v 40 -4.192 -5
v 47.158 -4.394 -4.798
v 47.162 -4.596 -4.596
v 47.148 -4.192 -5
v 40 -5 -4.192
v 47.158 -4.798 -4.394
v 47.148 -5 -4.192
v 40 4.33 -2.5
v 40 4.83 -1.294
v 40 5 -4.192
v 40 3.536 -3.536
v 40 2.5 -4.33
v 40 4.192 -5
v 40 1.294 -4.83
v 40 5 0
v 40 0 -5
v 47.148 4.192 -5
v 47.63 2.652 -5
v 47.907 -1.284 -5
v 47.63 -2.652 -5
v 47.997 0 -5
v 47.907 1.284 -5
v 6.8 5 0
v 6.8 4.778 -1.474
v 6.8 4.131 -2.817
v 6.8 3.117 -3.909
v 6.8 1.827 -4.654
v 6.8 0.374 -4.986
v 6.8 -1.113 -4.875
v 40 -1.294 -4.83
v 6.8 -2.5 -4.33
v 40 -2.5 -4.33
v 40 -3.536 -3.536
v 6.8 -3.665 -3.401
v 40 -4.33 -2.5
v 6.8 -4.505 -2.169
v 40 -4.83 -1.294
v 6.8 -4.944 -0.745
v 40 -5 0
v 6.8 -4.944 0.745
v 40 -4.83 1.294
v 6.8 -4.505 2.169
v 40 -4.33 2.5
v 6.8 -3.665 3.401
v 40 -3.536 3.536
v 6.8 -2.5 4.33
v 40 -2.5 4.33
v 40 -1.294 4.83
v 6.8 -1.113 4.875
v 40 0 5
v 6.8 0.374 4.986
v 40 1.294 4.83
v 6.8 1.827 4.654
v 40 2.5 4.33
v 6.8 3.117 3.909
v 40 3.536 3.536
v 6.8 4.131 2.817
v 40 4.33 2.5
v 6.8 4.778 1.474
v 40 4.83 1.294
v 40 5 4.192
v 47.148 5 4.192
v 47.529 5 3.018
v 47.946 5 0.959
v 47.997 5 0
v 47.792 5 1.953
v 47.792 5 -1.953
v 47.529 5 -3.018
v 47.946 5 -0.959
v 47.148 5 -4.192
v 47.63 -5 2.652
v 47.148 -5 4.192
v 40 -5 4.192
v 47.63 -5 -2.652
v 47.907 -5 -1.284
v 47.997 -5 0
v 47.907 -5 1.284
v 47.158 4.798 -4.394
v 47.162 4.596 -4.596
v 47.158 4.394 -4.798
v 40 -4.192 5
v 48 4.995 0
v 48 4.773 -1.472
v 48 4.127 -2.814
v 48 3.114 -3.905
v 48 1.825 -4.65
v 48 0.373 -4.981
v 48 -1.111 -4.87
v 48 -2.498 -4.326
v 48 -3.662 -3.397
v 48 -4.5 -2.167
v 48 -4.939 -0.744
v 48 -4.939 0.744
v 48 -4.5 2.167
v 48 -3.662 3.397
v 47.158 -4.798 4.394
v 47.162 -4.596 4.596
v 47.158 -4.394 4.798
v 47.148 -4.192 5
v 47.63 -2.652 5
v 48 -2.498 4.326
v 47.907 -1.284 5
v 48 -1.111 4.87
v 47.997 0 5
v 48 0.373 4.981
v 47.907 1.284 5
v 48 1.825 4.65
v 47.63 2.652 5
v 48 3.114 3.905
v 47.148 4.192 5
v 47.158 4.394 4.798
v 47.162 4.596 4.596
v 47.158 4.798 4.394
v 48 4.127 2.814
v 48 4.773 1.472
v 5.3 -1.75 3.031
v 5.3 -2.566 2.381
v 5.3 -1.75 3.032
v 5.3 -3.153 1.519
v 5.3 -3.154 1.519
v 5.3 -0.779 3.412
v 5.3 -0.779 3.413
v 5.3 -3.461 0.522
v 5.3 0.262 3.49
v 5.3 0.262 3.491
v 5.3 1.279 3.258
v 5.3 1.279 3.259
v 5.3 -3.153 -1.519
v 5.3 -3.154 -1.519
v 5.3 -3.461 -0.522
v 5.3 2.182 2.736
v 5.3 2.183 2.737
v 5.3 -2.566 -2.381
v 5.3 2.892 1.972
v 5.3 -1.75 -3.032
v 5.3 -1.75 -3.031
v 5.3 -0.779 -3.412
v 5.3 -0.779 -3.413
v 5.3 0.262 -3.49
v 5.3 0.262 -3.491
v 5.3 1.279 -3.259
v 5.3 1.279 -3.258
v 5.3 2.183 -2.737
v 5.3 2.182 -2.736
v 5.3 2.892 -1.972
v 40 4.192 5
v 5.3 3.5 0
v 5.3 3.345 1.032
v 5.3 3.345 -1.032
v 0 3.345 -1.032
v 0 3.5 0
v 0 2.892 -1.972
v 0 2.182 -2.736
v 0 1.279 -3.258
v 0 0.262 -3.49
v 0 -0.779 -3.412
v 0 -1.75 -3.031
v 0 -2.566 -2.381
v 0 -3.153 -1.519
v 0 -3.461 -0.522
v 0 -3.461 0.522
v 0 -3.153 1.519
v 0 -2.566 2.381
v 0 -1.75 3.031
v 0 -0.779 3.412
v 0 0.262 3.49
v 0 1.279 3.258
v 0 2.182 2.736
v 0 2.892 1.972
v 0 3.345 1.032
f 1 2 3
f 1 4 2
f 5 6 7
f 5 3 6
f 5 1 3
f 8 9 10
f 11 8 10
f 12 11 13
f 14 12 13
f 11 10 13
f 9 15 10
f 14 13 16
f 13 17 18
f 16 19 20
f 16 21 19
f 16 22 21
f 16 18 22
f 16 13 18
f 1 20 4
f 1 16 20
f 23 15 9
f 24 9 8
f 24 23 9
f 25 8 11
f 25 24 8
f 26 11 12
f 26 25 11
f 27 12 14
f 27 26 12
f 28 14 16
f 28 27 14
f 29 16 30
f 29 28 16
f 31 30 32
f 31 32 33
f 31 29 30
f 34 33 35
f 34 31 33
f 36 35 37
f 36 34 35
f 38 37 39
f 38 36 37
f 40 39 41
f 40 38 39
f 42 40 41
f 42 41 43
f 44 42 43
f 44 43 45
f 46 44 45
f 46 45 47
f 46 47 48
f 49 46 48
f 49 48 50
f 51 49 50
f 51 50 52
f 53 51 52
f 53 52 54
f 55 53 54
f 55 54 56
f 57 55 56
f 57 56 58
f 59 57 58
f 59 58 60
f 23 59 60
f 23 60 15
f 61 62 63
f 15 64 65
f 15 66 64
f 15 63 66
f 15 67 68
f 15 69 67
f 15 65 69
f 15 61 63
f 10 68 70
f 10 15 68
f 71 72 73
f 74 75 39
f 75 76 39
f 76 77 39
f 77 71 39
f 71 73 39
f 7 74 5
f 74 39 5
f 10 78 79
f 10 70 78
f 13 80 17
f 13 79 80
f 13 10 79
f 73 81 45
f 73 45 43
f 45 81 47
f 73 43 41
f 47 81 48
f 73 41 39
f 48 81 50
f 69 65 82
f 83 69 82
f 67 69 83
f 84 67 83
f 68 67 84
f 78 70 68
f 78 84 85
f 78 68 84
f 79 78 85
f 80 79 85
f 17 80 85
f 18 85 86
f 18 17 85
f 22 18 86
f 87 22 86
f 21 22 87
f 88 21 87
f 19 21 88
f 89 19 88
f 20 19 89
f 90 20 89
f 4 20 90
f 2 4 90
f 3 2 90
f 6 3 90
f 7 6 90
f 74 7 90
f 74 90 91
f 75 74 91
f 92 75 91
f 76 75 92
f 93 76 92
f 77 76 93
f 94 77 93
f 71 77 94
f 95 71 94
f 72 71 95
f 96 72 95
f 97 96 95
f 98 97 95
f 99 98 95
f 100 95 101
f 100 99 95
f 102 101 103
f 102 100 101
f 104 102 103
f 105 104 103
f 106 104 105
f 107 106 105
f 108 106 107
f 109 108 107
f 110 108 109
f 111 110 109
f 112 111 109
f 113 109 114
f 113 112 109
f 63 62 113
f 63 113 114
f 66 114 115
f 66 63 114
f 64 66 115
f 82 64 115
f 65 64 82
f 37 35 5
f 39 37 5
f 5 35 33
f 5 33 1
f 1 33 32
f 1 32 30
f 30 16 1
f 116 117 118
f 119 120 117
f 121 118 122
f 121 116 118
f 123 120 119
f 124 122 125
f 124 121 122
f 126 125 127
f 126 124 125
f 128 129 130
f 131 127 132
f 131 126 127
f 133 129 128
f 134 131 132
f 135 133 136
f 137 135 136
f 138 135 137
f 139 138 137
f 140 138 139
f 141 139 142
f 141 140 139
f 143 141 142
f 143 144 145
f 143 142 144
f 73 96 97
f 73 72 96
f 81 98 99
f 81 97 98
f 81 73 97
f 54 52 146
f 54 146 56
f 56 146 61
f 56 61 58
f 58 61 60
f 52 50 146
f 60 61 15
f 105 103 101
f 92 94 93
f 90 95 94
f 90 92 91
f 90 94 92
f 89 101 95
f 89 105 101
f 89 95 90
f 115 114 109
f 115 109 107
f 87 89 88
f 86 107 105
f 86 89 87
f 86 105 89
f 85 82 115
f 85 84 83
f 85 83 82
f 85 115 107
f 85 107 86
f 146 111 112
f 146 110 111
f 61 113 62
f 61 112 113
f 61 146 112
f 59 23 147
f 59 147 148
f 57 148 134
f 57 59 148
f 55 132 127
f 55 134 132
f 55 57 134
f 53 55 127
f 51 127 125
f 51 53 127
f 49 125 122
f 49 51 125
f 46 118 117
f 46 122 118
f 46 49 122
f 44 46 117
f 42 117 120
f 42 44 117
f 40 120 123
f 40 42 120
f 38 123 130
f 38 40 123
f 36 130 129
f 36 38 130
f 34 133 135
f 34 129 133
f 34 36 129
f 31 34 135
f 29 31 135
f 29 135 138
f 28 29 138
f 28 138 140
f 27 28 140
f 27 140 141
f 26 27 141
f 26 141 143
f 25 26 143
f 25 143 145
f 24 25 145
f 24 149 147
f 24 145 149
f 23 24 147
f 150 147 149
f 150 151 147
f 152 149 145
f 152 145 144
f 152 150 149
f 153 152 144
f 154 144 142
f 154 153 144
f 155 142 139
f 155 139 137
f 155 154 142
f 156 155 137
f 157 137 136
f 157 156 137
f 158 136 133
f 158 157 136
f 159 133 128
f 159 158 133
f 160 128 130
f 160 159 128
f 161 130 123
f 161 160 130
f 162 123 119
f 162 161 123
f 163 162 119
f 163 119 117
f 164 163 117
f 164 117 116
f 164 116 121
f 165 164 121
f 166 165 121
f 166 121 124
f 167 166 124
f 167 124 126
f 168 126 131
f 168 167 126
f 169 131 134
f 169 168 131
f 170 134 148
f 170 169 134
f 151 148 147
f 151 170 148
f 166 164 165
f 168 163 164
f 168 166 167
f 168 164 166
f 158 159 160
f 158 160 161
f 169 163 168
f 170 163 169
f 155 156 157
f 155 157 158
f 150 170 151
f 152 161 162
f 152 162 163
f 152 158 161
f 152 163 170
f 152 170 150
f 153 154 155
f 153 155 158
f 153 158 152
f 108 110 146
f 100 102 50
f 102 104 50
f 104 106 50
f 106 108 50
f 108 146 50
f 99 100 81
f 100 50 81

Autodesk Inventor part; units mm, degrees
ref_plane "YZ Plane" through (0, 0, 0) normal (1, 0, 0) x (0, 1, 0)
ref_plane "XZ Plane" through (0, 0, 0) normal (0, 1, 0) x (-1, 0, 0)
sketch "Эскиз1" plane through (0, 0, 0) normal (0, 0, 1) x (1, 0, 0)
  line L0 (40, 0) -> (40, 5)
  line L1 (40, 5) -> (5.3, 5)
  line L2 (40, 0) -> (0, 0)
  line L3 (5.3, 3.5) -> (0, 3.5)
  line L4 (0, 3.5) -> (0, 0)
  line L5 (5.3, 5) -> (5.3, 3.5)
  line L6 (0, 6) -> (0, -1) projected
  line L7 (-8, 0) -> (48, 0) projected
  dimension "d0" = 10
  dimension "d10" = 40
  dimension "d11" = 7
  dimension "d12" = 5.3
revolve "Базовый элемент" add sketch "Эскиз1" angle 360 about axis through (40, 0, 0) along (-1, 0, 0)
sketch "Эскиз2" plane through (40, 0, 0) normal (1, 0, 0) x (0, 0, -1)
  line L0 (0, 5) -> (4.1924, 5)
  line L1 (5, 4.1924) -> (5, 0)
  line L2 (5, 0) -> (0, 0) construction
  line L3 (0, 0) -> (0, 5) construction
  line L4 (0, -7) -> (0, 7) projected
  line L5 (7, 0) -> (-7, 0) projected
  line L6 (0, 5) -> (-4.1924, 5)
  line L7 (-5, 4.1924) -> (-5, -4.1924)
  line L8 (0, -5) -> (4.1924, -5)
  line L9 (5, -4.1924) -> (5, 0)
  line L10 (0, -5) -> (-4.1924, -5)
  line L11 (-5, -4.1924) -> (-5, 0)
  circle A0 centre (0, 0) radius 5 projected
  line L12 (4.1924, 5) -> (5, 4.1924)
  line L13 (5, -4.1924) -> (4.1924, -5)
  line L14 (-4.1924, -5) -> (-5, -4.1924)
  line L15 (-5, 4.1924) -> (-4.1924, 5)
  point P0 (2.0767, 5)
  point P1 (5, 2.0767)
  point P2 (-2.0767, 5)
  point P3 (-5, 2.0767)
  point P4 (2.0767, -5)
  point P5 (5, -2.0767)
  point P6 (-2.0767, -5)
  point P7 (-5, -2.0767)
  dimension "d3" = 5
  dimension "d4" = 5
  dimension "d60" = 13
extrude "С головкой" add sketch "Эскиз2" along normal blind 8
sketch "Эскиз3" plane through (0, 0, 0) normal (0, 0, 1) x (1, 0, 0)
  line L0 (48, 4.995) -> (48, 7.15)
  line L1 (48, 7.15) -> (46.8, 7.15)
  line L2 (40, 0) -> (40, 5) projected
  line L3 (40, 0) -> (48, 0)
  line L4 (46.8, 7.15) -> (48, 4.995)
  line L5 (0, -3.922) -> (0, 8.9953) projected
  line L6 (40, 5) -> (40, -2.0767) projected
  line L7 (48, -2.0767) -> (48, 2.0767) projected
  line L8 (2.4, 0) -> (55.6, 0) projected
  point P0 (10, -2.0767)
  point P1 (15, -2.0767)
  point P2 (15, 2.0767)
  point P3 (44, 0)
  dimension "d14" = 14.3
  dimension "d15" = 9.99
  dimension "d18" = 48
  dimension "d19" = 1.2
revolve "Фаска1" cut sketch "Эскиз3" angle 360 about axis through (40, 0, 0) along (1, 0, 0)
chamfer "Фаска2" distance 1.5 angle 45 1 edges at (5.3, -5, 0) measured on face at (16.8667, 0, -5)
thread "Резьба" size "M10x1.5" class "6g" standard "ISO Metric profile" full length
ref_plane "Work Plane1" through (0, 0, 0) normal (0, 0, 1) x (1, 0, 0)
equation "\"d0\" = NND"
equation "\"d10\" = NLG"
equation "\"d11\" = SPD"
equation "\"d12\" = ZLG"
equation "\"d3\" = 0.5 * SW"
equation "\"d4\" = 0.5 * SW"
equation "\"d60\" = KOD"
equation "\"d1\" = KOH"
equation "\"d14\" = 1.1 * KOD"
equation "\"d18\" = NLG + KOH"
equation "\"d19\" = 0.15 * KOH"
equation "\"d6\" = -0.5 * SPD + 0.5 * NND"
equation "\"d7\" = FAWI1"
equation "\"d56\" = -0.5 * SPD + 0.5 * NND"
equation "\"d16\" = NLG"
equation "\"NND\" = 10"
equation "\"NLG\" = 40"
equation "\"SPD\" = 7"
equation "\"KOD\" = 13"
equation "\"KOH\" = 8"
equation "\"FAWI1\" = 45deg"
equation "\"ZLG\" = 5.3"
equation "\"GUL\" = 0.61345 * PTC"
equation "\"TOA\" = 30deg"
equation "\"PTC\" = 1.5"
equation "\"GAL\" = 0.61345 * PTC"
equation "\"GD1\" = THREADDIA - 1.2269 * PTC"
equation "\"SW\" = 10"
equation "\"THREADDIA\" = 10"
properties part number "Винт M10-6gx40 ГОСТ 1482-84" material "Сталь, мягкая"
